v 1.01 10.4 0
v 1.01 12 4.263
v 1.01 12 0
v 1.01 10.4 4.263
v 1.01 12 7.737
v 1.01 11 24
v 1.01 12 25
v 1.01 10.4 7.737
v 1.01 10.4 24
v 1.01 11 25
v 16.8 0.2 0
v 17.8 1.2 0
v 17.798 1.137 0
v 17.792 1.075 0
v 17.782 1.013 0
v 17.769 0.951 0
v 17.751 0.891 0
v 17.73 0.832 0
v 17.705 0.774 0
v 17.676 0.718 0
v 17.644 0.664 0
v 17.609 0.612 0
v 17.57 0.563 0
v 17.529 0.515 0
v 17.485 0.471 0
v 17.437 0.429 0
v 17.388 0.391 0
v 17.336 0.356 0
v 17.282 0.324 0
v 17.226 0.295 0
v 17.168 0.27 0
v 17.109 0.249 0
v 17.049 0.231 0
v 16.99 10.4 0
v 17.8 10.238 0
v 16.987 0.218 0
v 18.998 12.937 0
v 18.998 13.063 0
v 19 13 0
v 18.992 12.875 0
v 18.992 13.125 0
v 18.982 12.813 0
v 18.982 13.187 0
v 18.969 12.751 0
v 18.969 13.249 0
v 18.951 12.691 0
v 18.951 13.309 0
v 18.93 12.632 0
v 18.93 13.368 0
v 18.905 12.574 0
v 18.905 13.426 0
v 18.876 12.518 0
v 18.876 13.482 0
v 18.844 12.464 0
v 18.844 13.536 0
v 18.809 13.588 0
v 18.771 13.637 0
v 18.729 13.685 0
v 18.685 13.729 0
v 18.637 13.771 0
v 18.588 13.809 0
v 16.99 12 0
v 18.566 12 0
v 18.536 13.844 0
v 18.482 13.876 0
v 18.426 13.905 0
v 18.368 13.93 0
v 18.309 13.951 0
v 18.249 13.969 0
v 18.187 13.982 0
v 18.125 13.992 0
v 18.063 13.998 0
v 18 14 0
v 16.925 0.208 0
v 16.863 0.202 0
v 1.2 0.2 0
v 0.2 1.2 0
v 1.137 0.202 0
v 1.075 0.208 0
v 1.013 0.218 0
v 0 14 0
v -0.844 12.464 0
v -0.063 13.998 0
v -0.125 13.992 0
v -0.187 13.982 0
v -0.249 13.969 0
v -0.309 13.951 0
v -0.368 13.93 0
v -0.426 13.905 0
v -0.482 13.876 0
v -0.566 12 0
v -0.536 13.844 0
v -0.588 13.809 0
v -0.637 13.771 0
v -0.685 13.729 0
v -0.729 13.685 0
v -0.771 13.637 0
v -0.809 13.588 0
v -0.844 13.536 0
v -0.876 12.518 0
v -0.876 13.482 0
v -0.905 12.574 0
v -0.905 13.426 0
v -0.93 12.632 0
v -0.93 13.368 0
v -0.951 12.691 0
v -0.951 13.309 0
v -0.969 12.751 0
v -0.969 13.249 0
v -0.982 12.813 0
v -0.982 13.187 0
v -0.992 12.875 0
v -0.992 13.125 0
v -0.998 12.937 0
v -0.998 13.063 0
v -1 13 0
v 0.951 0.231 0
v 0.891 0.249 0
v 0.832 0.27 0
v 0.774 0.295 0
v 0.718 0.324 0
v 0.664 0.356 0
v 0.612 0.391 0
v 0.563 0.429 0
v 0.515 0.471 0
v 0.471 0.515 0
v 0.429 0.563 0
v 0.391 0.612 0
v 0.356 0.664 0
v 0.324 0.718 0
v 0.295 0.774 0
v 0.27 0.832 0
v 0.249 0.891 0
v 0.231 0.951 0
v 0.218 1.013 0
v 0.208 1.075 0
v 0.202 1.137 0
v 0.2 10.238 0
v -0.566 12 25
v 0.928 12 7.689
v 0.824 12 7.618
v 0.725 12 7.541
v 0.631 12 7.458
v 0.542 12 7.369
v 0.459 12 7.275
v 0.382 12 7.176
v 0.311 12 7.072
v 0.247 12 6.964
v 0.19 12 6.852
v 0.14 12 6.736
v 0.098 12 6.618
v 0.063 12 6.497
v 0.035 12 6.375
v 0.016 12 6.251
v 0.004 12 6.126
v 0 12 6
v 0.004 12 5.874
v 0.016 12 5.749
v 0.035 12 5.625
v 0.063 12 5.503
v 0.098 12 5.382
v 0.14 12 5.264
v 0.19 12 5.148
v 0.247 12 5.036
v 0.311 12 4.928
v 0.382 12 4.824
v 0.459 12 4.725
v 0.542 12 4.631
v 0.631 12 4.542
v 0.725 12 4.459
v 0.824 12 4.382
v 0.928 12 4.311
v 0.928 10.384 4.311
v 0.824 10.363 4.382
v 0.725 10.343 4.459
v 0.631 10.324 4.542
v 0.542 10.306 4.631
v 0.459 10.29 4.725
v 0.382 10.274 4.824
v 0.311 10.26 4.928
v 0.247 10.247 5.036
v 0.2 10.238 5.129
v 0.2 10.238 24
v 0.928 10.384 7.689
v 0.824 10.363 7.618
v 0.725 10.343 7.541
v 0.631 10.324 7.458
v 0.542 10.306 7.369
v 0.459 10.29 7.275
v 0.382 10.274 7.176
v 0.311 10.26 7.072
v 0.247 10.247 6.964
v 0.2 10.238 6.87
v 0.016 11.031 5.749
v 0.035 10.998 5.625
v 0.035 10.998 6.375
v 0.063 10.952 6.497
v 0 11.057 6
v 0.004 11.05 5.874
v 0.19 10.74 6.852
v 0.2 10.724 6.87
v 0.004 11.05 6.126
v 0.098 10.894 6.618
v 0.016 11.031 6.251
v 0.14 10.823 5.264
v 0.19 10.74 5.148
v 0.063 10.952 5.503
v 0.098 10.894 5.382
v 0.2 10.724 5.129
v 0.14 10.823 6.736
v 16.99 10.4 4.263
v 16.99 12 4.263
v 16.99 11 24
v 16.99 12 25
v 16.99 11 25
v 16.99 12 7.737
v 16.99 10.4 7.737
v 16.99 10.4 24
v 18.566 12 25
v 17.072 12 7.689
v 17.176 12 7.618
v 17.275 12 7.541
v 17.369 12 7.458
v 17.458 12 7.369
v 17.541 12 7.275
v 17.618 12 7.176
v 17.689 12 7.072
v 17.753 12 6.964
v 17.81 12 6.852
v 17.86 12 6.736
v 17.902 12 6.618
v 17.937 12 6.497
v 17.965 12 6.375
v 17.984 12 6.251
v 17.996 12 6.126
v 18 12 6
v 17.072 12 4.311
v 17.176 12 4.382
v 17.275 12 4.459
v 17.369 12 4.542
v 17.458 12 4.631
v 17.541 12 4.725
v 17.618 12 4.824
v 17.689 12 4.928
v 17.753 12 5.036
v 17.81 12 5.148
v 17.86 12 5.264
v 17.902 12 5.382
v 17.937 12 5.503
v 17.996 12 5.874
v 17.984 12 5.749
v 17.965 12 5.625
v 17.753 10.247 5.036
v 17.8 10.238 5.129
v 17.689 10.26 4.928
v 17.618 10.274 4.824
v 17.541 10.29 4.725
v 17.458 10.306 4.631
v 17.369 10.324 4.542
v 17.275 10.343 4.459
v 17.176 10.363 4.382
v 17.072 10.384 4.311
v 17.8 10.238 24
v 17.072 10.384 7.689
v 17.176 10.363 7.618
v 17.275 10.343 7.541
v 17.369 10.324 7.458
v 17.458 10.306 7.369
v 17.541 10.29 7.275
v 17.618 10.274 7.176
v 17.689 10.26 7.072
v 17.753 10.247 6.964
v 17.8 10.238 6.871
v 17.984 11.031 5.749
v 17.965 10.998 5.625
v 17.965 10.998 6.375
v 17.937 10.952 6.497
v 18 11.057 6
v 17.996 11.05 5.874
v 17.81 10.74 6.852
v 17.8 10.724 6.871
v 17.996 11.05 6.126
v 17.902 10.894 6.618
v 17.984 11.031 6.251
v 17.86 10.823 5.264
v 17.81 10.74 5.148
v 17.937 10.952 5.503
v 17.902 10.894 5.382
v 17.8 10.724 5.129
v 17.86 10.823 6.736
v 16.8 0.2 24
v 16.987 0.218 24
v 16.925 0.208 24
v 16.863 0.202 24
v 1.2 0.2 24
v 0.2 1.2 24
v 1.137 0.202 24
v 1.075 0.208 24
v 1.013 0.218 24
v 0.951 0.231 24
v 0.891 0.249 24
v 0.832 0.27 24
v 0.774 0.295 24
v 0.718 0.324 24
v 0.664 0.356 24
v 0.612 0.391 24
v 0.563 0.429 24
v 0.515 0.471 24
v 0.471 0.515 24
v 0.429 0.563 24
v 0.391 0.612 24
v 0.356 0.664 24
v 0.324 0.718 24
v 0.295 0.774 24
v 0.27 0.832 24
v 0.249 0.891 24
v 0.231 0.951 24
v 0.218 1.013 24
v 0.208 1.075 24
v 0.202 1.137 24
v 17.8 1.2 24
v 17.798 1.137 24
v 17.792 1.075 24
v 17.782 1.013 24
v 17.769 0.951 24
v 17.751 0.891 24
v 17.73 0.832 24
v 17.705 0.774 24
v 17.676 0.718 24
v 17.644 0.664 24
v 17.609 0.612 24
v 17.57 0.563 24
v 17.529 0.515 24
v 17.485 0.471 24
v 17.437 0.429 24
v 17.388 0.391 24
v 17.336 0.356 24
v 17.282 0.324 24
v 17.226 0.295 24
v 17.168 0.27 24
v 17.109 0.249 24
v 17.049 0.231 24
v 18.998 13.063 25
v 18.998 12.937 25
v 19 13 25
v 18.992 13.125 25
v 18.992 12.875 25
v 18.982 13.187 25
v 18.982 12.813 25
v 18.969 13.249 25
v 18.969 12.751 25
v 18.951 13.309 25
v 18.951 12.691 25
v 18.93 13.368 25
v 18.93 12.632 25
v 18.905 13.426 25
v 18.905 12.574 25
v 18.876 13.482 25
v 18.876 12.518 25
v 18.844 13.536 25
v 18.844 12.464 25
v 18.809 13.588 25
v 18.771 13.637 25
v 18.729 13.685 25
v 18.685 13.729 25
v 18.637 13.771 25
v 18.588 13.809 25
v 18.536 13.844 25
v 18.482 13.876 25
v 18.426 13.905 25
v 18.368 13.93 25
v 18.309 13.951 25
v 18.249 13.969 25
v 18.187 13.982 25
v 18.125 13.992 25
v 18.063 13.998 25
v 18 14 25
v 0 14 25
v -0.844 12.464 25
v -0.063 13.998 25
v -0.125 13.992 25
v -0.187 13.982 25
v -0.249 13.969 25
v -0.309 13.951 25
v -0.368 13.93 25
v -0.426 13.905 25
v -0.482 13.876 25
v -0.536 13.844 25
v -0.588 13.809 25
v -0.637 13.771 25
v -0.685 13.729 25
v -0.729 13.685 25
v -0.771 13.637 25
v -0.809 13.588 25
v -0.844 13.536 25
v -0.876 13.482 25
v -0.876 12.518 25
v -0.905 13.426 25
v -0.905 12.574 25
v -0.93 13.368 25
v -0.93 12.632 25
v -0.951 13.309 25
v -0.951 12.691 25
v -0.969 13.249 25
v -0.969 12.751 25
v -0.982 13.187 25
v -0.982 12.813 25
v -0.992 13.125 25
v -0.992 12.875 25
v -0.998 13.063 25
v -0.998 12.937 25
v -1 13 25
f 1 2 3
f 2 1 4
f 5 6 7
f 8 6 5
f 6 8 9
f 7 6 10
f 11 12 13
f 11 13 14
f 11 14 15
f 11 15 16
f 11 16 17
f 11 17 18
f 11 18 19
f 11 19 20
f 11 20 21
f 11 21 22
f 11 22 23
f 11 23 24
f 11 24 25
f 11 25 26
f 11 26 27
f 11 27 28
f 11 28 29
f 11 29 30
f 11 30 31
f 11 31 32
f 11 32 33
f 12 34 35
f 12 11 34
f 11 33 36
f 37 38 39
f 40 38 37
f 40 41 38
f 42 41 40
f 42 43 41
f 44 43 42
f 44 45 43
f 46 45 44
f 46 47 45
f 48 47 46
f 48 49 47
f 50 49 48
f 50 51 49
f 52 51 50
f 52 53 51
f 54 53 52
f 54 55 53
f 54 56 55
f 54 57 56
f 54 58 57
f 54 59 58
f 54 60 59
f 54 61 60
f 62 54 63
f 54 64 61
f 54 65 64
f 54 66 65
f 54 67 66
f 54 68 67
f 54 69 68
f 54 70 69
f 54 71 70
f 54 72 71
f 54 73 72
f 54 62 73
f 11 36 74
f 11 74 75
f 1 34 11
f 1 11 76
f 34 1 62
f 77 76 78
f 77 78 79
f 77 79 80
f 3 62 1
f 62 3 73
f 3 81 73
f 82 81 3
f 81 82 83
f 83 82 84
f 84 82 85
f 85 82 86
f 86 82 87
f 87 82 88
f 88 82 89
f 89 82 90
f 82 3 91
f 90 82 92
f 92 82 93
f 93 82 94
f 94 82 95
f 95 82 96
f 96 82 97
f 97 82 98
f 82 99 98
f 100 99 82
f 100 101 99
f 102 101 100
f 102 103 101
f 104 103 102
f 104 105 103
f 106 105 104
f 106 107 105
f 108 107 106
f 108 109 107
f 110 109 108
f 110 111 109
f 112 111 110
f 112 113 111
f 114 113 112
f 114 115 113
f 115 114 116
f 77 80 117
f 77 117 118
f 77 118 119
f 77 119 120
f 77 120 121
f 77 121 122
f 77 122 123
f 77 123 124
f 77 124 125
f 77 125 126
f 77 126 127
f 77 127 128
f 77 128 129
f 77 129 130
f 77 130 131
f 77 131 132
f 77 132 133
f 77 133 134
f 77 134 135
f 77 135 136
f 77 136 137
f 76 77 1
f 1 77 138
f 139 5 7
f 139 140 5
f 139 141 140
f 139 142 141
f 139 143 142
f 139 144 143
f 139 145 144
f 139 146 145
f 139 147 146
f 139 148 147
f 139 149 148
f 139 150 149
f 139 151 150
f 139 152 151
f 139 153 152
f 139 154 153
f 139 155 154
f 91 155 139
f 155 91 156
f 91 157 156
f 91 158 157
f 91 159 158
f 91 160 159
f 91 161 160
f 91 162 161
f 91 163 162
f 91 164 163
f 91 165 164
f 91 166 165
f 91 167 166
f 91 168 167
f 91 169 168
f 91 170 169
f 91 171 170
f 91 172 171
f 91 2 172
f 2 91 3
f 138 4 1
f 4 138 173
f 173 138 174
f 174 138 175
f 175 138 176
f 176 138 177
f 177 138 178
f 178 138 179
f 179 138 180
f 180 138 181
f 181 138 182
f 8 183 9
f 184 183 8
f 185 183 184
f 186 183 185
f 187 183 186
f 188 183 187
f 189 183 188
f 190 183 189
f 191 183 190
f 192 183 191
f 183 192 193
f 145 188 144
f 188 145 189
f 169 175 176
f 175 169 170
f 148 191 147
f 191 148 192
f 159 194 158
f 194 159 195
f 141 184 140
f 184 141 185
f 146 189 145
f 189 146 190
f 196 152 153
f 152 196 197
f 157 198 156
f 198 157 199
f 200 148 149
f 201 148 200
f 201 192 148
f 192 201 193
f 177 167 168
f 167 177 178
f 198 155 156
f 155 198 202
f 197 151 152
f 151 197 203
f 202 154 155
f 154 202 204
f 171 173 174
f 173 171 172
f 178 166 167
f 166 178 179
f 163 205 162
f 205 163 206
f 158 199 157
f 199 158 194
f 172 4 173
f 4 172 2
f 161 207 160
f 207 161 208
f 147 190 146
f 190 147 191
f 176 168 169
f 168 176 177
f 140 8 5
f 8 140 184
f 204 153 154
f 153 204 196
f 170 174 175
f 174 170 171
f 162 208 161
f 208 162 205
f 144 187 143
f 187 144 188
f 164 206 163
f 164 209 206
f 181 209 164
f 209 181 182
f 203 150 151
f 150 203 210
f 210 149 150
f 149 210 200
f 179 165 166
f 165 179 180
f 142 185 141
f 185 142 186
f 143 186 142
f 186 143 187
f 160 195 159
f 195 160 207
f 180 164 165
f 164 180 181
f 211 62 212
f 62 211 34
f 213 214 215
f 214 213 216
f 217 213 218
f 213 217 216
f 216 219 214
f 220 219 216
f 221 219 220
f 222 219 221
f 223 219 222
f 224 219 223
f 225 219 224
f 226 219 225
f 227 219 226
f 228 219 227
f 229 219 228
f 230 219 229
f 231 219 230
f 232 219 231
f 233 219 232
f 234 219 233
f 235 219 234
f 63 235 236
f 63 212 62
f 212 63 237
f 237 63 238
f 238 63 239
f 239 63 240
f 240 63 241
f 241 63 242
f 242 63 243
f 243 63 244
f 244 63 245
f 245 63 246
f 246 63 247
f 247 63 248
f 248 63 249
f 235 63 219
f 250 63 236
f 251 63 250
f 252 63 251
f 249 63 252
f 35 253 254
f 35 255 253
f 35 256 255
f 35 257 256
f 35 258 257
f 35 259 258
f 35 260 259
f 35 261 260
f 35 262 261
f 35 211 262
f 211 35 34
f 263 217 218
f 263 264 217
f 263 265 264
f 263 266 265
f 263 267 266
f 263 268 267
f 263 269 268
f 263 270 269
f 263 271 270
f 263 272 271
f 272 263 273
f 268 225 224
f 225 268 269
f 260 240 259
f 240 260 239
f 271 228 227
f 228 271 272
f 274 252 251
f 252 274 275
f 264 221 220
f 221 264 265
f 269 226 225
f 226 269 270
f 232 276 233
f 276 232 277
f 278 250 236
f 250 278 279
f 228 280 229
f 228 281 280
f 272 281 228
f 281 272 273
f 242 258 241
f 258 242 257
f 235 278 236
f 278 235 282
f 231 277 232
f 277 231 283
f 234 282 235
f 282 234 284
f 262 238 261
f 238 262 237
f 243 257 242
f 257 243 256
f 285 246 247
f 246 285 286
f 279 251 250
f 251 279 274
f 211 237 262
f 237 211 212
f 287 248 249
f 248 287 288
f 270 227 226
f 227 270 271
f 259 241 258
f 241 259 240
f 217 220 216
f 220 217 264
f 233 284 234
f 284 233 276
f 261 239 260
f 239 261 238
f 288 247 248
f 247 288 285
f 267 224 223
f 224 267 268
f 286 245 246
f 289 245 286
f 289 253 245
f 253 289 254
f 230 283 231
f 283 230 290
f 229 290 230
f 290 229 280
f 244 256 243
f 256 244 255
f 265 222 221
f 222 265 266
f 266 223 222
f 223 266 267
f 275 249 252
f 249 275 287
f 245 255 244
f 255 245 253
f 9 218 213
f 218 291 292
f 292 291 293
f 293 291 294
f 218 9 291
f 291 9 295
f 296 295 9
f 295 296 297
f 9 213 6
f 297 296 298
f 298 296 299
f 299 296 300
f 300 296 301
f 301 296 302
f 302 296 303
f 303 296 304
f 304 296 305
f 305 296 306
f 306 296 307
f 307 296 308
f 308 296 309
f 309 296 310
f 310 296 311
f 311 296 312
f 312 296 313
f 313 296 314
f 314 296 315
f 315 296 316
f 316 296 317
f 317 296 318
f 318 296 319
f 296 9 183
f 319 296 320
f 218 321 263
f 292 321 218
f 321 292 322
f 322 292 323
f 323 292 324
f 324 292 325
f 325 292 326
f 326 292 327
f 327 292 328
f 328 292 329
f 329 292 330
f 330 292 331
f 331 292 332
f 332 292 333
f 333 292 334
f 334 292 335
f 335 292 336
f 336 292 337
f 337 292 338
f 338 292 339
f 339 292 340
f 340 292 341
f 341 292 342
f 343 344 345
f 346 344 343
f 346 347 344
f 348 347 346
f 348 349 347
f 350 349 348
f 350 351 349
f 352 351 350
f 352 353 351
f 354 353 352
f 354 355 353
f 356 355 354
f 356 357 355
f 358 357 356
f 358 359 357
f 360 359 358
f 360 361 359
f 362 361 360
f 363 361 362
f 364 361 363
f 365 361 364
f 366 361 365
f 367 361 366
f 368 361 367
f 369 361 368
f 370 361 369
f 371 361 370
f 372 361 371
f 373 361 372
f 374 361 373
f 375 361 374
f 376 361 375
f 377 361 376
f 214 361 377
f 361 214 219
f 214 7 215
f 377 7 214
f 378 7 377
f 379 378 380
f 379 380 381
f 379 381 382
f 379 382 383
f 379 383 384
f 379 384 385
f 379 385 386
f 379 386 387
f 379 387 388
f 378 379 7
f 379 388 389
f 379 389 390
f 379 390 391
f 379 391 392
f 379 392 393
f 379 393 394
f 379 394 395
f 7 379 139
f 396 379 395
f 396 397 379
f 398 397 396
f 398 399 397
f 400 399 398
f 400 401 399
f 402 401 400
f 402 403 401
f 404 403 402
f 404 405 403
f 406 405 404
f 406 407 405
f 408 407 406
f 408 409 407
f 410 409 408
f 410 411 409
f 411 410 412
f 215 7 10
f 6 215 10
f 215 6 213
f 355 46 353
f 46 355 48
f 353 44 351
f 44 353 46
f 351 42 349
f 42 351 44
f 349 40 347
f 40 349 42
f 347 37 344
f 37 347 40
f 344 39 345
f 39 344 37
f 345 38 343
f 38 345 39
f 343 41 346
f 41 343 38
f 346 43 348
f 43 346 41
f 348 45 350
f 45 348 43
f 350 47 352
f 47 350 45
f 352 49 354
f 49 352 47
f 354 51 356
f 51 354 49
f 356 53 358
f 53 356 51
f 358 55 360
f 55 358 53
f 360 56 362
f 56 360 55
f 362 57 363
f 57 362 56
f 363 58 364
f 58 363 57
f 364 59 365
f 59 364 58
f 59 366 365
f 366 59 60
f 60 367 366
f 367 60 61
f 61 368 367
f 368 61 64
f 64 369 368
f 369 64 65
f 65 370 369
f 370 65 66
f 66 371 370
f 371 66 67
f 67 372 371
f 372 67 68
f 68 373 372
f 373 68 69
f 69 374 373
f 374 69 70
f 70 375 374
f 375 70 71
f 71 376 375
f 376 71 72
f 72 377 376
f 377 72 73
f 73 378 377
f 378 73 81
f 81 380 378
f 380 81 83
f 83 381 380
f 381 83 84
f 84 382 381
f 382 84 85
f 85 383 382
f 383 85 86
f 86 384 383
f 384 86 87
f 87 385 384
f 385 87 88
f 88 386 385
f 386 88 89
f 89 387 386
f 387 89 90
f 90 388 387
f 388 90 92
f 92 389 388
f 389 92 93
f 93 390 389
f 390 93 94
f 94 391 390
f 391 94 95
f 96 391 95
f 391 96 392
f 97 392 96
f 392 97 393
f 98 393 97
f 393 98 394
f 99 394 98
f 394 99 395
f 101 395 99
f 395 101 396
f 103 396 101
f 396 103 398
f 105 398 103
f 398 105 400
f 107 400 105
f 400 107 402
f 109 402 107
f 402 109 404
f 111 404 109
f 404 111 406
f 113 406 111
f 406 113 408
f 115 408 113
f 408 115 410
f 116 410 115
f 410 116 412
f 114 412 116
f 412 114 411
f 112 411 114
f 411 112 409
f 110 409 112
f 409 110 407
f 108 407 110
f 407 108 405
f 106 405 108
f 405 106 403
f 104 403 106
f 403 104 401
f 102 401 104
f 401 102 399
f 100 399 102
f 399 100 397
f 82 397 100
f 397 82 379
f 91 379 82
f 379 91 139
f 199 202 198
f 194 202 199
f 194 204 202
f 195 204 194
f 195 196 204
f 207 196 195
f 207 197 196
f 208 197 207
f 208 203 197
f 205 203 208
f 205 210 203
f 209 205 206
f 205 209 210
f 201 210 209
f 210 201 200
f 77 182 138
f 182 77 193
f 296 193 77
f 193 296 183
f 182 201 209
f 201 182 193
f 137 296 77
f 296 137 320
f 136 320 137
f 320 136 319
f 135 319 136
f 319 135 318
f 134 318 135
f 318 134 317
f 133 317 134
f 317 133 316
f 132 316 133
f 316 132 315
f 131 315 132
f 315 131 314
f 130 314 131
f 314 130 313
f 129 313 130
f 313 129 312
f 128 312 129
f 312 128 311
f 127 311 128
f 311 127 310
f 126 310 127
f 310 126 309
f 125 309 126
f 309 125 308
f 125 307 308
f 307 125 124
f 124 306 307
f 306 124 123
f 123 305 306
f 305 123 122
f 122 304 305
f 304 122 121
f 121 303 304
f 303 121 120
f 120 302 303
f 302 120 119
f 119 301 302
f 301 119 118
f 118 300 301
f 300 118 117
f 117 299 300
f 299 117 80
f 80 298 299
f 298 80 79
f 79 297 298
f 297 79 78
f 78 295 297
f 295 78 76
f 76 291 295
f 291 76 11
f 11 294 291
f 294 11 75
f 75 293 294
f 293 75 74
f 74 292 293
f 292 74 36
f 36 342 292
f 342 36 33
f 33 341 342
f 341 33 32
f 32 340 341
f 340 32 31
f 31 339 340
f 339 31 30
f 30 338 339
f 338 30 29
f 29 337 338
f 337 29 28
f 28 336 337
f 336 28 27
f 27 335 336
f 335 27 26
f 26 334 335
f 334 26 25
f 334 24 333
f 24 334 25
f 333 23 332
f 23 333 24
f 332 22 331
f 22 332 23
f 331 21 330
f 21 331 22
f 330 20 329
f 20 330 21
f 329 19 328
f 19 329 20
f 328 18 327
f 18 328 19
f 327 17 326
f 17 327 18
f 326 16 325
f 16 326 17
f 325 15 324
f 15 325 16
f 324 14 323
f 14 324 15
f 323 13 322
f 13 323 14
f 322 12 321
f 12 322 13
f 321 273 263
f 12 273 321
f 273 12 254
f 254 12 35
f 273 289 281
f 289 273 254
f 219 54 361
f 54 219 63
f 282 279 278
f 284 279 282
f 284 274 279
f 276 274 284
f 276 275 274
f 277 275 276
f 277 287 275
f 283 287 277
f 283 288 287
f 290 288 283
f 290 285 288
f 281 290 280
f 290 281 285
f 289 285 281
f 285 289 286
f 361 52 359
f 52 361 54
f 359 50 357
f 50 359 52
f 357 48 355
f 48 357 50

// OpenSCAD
module slot_with_catch_bump(length,width,height,with_bump=true)
{
    overhang_droop = width/5;
    difference(){
        linear_extrude(length)hull(){
            square([.01,height]);
            translate([width,overhang_droop,0])square([.01,height-overhang_droop]);
        }      
        if(with_bump)
        {
            translate([width*1.5,height,width*3])rotate([90,0,0])linear_extrude(height)circle(r=width);
        }
    }
}

module slide_top_case_blank(top,bottom,length,width,depth,minkowski_diameter,top_thickness,top_looseness=.5){
    if(bottom){
        difference(){
            linear_extrude(length)minkowski(){
                // square([width-minkowski_diameter,depth-minkowski_diameter]);
                polygon([
                    [top_thickness+top_looseness,top_thickness+top_looseness],
                    [-top_thickness-top_looseness+width-minkowski_diameter,top_thickness+top_looseness],
                    [-top_thickness-top_looseness+width-minkowski_diameter,depth-top_thickness*2-minkowski_diameter],
                    [width-minkowski_diameter,depth-minkowski_diameter],
                    [0,depth-minkowski_diameter],
                    [top_thickness+top_looseness,depth-top_thickness*2-minkowski_diameter],
                    ]);
                circle(d=minkowski_diameter);
            }
            union(){
                // slots for slide 
                translate([-minkowski_diameter/2,depth-top_thickness*3-minkowski_diameter,0])slot_with_catch_bump(length+1,top_thickness*2,top_thickness*2);
                translate([width-minkowski_diameter/2,depth-top_thickness*3-minkowski_diameter,0])mirror([1,0,0])slot_with_catch_bump(length+1,top_thickness*2,top_thickness*2);
                // space for end
                translate([-minkowski_diameter/2,-minkowski_diameter*2,length-top_thickness])linear_extrude(top_thickness)square([width,depth]);
            };
        }
    }
    if(top){
        difference(){
            linear_extrude(length){
                minkowski(){
                    // square([width-minkowski_diameter,depth-minkowski_diameter]);
                    polygon([
                        [0,0],
                        [width-minkowski_diameter,0],
                        [width-minkowski_diameter,depth-minkowski_diameter*2],
                        [0,depth-minkowski_diameter*2],,
                        ]);
                    circle(d=minkowski_diameter);
                }
            }
        slide_top_case_blank(bottom=true,top=false,length=length,width=width,depth=depth,minkowski_diameter=minkowski_diameter+top_looseness,top_thickness=top_thickness-top_looseness,top_looseness=0);
        }
    }
}
$fn=100;
color("yellow",.1)slide_top_case_blank(bottom=false,top=false,length=25,width=20,depth=15,minkowski_diameter=2,top_thickness=1,top_looseness=.2);
color("red",.1)slide_top_case_blank(bottom=true,top=false,length=25,width=20,depth=15,minkowski_diameter=2,top_thickness=1,top_looseness=.2);
